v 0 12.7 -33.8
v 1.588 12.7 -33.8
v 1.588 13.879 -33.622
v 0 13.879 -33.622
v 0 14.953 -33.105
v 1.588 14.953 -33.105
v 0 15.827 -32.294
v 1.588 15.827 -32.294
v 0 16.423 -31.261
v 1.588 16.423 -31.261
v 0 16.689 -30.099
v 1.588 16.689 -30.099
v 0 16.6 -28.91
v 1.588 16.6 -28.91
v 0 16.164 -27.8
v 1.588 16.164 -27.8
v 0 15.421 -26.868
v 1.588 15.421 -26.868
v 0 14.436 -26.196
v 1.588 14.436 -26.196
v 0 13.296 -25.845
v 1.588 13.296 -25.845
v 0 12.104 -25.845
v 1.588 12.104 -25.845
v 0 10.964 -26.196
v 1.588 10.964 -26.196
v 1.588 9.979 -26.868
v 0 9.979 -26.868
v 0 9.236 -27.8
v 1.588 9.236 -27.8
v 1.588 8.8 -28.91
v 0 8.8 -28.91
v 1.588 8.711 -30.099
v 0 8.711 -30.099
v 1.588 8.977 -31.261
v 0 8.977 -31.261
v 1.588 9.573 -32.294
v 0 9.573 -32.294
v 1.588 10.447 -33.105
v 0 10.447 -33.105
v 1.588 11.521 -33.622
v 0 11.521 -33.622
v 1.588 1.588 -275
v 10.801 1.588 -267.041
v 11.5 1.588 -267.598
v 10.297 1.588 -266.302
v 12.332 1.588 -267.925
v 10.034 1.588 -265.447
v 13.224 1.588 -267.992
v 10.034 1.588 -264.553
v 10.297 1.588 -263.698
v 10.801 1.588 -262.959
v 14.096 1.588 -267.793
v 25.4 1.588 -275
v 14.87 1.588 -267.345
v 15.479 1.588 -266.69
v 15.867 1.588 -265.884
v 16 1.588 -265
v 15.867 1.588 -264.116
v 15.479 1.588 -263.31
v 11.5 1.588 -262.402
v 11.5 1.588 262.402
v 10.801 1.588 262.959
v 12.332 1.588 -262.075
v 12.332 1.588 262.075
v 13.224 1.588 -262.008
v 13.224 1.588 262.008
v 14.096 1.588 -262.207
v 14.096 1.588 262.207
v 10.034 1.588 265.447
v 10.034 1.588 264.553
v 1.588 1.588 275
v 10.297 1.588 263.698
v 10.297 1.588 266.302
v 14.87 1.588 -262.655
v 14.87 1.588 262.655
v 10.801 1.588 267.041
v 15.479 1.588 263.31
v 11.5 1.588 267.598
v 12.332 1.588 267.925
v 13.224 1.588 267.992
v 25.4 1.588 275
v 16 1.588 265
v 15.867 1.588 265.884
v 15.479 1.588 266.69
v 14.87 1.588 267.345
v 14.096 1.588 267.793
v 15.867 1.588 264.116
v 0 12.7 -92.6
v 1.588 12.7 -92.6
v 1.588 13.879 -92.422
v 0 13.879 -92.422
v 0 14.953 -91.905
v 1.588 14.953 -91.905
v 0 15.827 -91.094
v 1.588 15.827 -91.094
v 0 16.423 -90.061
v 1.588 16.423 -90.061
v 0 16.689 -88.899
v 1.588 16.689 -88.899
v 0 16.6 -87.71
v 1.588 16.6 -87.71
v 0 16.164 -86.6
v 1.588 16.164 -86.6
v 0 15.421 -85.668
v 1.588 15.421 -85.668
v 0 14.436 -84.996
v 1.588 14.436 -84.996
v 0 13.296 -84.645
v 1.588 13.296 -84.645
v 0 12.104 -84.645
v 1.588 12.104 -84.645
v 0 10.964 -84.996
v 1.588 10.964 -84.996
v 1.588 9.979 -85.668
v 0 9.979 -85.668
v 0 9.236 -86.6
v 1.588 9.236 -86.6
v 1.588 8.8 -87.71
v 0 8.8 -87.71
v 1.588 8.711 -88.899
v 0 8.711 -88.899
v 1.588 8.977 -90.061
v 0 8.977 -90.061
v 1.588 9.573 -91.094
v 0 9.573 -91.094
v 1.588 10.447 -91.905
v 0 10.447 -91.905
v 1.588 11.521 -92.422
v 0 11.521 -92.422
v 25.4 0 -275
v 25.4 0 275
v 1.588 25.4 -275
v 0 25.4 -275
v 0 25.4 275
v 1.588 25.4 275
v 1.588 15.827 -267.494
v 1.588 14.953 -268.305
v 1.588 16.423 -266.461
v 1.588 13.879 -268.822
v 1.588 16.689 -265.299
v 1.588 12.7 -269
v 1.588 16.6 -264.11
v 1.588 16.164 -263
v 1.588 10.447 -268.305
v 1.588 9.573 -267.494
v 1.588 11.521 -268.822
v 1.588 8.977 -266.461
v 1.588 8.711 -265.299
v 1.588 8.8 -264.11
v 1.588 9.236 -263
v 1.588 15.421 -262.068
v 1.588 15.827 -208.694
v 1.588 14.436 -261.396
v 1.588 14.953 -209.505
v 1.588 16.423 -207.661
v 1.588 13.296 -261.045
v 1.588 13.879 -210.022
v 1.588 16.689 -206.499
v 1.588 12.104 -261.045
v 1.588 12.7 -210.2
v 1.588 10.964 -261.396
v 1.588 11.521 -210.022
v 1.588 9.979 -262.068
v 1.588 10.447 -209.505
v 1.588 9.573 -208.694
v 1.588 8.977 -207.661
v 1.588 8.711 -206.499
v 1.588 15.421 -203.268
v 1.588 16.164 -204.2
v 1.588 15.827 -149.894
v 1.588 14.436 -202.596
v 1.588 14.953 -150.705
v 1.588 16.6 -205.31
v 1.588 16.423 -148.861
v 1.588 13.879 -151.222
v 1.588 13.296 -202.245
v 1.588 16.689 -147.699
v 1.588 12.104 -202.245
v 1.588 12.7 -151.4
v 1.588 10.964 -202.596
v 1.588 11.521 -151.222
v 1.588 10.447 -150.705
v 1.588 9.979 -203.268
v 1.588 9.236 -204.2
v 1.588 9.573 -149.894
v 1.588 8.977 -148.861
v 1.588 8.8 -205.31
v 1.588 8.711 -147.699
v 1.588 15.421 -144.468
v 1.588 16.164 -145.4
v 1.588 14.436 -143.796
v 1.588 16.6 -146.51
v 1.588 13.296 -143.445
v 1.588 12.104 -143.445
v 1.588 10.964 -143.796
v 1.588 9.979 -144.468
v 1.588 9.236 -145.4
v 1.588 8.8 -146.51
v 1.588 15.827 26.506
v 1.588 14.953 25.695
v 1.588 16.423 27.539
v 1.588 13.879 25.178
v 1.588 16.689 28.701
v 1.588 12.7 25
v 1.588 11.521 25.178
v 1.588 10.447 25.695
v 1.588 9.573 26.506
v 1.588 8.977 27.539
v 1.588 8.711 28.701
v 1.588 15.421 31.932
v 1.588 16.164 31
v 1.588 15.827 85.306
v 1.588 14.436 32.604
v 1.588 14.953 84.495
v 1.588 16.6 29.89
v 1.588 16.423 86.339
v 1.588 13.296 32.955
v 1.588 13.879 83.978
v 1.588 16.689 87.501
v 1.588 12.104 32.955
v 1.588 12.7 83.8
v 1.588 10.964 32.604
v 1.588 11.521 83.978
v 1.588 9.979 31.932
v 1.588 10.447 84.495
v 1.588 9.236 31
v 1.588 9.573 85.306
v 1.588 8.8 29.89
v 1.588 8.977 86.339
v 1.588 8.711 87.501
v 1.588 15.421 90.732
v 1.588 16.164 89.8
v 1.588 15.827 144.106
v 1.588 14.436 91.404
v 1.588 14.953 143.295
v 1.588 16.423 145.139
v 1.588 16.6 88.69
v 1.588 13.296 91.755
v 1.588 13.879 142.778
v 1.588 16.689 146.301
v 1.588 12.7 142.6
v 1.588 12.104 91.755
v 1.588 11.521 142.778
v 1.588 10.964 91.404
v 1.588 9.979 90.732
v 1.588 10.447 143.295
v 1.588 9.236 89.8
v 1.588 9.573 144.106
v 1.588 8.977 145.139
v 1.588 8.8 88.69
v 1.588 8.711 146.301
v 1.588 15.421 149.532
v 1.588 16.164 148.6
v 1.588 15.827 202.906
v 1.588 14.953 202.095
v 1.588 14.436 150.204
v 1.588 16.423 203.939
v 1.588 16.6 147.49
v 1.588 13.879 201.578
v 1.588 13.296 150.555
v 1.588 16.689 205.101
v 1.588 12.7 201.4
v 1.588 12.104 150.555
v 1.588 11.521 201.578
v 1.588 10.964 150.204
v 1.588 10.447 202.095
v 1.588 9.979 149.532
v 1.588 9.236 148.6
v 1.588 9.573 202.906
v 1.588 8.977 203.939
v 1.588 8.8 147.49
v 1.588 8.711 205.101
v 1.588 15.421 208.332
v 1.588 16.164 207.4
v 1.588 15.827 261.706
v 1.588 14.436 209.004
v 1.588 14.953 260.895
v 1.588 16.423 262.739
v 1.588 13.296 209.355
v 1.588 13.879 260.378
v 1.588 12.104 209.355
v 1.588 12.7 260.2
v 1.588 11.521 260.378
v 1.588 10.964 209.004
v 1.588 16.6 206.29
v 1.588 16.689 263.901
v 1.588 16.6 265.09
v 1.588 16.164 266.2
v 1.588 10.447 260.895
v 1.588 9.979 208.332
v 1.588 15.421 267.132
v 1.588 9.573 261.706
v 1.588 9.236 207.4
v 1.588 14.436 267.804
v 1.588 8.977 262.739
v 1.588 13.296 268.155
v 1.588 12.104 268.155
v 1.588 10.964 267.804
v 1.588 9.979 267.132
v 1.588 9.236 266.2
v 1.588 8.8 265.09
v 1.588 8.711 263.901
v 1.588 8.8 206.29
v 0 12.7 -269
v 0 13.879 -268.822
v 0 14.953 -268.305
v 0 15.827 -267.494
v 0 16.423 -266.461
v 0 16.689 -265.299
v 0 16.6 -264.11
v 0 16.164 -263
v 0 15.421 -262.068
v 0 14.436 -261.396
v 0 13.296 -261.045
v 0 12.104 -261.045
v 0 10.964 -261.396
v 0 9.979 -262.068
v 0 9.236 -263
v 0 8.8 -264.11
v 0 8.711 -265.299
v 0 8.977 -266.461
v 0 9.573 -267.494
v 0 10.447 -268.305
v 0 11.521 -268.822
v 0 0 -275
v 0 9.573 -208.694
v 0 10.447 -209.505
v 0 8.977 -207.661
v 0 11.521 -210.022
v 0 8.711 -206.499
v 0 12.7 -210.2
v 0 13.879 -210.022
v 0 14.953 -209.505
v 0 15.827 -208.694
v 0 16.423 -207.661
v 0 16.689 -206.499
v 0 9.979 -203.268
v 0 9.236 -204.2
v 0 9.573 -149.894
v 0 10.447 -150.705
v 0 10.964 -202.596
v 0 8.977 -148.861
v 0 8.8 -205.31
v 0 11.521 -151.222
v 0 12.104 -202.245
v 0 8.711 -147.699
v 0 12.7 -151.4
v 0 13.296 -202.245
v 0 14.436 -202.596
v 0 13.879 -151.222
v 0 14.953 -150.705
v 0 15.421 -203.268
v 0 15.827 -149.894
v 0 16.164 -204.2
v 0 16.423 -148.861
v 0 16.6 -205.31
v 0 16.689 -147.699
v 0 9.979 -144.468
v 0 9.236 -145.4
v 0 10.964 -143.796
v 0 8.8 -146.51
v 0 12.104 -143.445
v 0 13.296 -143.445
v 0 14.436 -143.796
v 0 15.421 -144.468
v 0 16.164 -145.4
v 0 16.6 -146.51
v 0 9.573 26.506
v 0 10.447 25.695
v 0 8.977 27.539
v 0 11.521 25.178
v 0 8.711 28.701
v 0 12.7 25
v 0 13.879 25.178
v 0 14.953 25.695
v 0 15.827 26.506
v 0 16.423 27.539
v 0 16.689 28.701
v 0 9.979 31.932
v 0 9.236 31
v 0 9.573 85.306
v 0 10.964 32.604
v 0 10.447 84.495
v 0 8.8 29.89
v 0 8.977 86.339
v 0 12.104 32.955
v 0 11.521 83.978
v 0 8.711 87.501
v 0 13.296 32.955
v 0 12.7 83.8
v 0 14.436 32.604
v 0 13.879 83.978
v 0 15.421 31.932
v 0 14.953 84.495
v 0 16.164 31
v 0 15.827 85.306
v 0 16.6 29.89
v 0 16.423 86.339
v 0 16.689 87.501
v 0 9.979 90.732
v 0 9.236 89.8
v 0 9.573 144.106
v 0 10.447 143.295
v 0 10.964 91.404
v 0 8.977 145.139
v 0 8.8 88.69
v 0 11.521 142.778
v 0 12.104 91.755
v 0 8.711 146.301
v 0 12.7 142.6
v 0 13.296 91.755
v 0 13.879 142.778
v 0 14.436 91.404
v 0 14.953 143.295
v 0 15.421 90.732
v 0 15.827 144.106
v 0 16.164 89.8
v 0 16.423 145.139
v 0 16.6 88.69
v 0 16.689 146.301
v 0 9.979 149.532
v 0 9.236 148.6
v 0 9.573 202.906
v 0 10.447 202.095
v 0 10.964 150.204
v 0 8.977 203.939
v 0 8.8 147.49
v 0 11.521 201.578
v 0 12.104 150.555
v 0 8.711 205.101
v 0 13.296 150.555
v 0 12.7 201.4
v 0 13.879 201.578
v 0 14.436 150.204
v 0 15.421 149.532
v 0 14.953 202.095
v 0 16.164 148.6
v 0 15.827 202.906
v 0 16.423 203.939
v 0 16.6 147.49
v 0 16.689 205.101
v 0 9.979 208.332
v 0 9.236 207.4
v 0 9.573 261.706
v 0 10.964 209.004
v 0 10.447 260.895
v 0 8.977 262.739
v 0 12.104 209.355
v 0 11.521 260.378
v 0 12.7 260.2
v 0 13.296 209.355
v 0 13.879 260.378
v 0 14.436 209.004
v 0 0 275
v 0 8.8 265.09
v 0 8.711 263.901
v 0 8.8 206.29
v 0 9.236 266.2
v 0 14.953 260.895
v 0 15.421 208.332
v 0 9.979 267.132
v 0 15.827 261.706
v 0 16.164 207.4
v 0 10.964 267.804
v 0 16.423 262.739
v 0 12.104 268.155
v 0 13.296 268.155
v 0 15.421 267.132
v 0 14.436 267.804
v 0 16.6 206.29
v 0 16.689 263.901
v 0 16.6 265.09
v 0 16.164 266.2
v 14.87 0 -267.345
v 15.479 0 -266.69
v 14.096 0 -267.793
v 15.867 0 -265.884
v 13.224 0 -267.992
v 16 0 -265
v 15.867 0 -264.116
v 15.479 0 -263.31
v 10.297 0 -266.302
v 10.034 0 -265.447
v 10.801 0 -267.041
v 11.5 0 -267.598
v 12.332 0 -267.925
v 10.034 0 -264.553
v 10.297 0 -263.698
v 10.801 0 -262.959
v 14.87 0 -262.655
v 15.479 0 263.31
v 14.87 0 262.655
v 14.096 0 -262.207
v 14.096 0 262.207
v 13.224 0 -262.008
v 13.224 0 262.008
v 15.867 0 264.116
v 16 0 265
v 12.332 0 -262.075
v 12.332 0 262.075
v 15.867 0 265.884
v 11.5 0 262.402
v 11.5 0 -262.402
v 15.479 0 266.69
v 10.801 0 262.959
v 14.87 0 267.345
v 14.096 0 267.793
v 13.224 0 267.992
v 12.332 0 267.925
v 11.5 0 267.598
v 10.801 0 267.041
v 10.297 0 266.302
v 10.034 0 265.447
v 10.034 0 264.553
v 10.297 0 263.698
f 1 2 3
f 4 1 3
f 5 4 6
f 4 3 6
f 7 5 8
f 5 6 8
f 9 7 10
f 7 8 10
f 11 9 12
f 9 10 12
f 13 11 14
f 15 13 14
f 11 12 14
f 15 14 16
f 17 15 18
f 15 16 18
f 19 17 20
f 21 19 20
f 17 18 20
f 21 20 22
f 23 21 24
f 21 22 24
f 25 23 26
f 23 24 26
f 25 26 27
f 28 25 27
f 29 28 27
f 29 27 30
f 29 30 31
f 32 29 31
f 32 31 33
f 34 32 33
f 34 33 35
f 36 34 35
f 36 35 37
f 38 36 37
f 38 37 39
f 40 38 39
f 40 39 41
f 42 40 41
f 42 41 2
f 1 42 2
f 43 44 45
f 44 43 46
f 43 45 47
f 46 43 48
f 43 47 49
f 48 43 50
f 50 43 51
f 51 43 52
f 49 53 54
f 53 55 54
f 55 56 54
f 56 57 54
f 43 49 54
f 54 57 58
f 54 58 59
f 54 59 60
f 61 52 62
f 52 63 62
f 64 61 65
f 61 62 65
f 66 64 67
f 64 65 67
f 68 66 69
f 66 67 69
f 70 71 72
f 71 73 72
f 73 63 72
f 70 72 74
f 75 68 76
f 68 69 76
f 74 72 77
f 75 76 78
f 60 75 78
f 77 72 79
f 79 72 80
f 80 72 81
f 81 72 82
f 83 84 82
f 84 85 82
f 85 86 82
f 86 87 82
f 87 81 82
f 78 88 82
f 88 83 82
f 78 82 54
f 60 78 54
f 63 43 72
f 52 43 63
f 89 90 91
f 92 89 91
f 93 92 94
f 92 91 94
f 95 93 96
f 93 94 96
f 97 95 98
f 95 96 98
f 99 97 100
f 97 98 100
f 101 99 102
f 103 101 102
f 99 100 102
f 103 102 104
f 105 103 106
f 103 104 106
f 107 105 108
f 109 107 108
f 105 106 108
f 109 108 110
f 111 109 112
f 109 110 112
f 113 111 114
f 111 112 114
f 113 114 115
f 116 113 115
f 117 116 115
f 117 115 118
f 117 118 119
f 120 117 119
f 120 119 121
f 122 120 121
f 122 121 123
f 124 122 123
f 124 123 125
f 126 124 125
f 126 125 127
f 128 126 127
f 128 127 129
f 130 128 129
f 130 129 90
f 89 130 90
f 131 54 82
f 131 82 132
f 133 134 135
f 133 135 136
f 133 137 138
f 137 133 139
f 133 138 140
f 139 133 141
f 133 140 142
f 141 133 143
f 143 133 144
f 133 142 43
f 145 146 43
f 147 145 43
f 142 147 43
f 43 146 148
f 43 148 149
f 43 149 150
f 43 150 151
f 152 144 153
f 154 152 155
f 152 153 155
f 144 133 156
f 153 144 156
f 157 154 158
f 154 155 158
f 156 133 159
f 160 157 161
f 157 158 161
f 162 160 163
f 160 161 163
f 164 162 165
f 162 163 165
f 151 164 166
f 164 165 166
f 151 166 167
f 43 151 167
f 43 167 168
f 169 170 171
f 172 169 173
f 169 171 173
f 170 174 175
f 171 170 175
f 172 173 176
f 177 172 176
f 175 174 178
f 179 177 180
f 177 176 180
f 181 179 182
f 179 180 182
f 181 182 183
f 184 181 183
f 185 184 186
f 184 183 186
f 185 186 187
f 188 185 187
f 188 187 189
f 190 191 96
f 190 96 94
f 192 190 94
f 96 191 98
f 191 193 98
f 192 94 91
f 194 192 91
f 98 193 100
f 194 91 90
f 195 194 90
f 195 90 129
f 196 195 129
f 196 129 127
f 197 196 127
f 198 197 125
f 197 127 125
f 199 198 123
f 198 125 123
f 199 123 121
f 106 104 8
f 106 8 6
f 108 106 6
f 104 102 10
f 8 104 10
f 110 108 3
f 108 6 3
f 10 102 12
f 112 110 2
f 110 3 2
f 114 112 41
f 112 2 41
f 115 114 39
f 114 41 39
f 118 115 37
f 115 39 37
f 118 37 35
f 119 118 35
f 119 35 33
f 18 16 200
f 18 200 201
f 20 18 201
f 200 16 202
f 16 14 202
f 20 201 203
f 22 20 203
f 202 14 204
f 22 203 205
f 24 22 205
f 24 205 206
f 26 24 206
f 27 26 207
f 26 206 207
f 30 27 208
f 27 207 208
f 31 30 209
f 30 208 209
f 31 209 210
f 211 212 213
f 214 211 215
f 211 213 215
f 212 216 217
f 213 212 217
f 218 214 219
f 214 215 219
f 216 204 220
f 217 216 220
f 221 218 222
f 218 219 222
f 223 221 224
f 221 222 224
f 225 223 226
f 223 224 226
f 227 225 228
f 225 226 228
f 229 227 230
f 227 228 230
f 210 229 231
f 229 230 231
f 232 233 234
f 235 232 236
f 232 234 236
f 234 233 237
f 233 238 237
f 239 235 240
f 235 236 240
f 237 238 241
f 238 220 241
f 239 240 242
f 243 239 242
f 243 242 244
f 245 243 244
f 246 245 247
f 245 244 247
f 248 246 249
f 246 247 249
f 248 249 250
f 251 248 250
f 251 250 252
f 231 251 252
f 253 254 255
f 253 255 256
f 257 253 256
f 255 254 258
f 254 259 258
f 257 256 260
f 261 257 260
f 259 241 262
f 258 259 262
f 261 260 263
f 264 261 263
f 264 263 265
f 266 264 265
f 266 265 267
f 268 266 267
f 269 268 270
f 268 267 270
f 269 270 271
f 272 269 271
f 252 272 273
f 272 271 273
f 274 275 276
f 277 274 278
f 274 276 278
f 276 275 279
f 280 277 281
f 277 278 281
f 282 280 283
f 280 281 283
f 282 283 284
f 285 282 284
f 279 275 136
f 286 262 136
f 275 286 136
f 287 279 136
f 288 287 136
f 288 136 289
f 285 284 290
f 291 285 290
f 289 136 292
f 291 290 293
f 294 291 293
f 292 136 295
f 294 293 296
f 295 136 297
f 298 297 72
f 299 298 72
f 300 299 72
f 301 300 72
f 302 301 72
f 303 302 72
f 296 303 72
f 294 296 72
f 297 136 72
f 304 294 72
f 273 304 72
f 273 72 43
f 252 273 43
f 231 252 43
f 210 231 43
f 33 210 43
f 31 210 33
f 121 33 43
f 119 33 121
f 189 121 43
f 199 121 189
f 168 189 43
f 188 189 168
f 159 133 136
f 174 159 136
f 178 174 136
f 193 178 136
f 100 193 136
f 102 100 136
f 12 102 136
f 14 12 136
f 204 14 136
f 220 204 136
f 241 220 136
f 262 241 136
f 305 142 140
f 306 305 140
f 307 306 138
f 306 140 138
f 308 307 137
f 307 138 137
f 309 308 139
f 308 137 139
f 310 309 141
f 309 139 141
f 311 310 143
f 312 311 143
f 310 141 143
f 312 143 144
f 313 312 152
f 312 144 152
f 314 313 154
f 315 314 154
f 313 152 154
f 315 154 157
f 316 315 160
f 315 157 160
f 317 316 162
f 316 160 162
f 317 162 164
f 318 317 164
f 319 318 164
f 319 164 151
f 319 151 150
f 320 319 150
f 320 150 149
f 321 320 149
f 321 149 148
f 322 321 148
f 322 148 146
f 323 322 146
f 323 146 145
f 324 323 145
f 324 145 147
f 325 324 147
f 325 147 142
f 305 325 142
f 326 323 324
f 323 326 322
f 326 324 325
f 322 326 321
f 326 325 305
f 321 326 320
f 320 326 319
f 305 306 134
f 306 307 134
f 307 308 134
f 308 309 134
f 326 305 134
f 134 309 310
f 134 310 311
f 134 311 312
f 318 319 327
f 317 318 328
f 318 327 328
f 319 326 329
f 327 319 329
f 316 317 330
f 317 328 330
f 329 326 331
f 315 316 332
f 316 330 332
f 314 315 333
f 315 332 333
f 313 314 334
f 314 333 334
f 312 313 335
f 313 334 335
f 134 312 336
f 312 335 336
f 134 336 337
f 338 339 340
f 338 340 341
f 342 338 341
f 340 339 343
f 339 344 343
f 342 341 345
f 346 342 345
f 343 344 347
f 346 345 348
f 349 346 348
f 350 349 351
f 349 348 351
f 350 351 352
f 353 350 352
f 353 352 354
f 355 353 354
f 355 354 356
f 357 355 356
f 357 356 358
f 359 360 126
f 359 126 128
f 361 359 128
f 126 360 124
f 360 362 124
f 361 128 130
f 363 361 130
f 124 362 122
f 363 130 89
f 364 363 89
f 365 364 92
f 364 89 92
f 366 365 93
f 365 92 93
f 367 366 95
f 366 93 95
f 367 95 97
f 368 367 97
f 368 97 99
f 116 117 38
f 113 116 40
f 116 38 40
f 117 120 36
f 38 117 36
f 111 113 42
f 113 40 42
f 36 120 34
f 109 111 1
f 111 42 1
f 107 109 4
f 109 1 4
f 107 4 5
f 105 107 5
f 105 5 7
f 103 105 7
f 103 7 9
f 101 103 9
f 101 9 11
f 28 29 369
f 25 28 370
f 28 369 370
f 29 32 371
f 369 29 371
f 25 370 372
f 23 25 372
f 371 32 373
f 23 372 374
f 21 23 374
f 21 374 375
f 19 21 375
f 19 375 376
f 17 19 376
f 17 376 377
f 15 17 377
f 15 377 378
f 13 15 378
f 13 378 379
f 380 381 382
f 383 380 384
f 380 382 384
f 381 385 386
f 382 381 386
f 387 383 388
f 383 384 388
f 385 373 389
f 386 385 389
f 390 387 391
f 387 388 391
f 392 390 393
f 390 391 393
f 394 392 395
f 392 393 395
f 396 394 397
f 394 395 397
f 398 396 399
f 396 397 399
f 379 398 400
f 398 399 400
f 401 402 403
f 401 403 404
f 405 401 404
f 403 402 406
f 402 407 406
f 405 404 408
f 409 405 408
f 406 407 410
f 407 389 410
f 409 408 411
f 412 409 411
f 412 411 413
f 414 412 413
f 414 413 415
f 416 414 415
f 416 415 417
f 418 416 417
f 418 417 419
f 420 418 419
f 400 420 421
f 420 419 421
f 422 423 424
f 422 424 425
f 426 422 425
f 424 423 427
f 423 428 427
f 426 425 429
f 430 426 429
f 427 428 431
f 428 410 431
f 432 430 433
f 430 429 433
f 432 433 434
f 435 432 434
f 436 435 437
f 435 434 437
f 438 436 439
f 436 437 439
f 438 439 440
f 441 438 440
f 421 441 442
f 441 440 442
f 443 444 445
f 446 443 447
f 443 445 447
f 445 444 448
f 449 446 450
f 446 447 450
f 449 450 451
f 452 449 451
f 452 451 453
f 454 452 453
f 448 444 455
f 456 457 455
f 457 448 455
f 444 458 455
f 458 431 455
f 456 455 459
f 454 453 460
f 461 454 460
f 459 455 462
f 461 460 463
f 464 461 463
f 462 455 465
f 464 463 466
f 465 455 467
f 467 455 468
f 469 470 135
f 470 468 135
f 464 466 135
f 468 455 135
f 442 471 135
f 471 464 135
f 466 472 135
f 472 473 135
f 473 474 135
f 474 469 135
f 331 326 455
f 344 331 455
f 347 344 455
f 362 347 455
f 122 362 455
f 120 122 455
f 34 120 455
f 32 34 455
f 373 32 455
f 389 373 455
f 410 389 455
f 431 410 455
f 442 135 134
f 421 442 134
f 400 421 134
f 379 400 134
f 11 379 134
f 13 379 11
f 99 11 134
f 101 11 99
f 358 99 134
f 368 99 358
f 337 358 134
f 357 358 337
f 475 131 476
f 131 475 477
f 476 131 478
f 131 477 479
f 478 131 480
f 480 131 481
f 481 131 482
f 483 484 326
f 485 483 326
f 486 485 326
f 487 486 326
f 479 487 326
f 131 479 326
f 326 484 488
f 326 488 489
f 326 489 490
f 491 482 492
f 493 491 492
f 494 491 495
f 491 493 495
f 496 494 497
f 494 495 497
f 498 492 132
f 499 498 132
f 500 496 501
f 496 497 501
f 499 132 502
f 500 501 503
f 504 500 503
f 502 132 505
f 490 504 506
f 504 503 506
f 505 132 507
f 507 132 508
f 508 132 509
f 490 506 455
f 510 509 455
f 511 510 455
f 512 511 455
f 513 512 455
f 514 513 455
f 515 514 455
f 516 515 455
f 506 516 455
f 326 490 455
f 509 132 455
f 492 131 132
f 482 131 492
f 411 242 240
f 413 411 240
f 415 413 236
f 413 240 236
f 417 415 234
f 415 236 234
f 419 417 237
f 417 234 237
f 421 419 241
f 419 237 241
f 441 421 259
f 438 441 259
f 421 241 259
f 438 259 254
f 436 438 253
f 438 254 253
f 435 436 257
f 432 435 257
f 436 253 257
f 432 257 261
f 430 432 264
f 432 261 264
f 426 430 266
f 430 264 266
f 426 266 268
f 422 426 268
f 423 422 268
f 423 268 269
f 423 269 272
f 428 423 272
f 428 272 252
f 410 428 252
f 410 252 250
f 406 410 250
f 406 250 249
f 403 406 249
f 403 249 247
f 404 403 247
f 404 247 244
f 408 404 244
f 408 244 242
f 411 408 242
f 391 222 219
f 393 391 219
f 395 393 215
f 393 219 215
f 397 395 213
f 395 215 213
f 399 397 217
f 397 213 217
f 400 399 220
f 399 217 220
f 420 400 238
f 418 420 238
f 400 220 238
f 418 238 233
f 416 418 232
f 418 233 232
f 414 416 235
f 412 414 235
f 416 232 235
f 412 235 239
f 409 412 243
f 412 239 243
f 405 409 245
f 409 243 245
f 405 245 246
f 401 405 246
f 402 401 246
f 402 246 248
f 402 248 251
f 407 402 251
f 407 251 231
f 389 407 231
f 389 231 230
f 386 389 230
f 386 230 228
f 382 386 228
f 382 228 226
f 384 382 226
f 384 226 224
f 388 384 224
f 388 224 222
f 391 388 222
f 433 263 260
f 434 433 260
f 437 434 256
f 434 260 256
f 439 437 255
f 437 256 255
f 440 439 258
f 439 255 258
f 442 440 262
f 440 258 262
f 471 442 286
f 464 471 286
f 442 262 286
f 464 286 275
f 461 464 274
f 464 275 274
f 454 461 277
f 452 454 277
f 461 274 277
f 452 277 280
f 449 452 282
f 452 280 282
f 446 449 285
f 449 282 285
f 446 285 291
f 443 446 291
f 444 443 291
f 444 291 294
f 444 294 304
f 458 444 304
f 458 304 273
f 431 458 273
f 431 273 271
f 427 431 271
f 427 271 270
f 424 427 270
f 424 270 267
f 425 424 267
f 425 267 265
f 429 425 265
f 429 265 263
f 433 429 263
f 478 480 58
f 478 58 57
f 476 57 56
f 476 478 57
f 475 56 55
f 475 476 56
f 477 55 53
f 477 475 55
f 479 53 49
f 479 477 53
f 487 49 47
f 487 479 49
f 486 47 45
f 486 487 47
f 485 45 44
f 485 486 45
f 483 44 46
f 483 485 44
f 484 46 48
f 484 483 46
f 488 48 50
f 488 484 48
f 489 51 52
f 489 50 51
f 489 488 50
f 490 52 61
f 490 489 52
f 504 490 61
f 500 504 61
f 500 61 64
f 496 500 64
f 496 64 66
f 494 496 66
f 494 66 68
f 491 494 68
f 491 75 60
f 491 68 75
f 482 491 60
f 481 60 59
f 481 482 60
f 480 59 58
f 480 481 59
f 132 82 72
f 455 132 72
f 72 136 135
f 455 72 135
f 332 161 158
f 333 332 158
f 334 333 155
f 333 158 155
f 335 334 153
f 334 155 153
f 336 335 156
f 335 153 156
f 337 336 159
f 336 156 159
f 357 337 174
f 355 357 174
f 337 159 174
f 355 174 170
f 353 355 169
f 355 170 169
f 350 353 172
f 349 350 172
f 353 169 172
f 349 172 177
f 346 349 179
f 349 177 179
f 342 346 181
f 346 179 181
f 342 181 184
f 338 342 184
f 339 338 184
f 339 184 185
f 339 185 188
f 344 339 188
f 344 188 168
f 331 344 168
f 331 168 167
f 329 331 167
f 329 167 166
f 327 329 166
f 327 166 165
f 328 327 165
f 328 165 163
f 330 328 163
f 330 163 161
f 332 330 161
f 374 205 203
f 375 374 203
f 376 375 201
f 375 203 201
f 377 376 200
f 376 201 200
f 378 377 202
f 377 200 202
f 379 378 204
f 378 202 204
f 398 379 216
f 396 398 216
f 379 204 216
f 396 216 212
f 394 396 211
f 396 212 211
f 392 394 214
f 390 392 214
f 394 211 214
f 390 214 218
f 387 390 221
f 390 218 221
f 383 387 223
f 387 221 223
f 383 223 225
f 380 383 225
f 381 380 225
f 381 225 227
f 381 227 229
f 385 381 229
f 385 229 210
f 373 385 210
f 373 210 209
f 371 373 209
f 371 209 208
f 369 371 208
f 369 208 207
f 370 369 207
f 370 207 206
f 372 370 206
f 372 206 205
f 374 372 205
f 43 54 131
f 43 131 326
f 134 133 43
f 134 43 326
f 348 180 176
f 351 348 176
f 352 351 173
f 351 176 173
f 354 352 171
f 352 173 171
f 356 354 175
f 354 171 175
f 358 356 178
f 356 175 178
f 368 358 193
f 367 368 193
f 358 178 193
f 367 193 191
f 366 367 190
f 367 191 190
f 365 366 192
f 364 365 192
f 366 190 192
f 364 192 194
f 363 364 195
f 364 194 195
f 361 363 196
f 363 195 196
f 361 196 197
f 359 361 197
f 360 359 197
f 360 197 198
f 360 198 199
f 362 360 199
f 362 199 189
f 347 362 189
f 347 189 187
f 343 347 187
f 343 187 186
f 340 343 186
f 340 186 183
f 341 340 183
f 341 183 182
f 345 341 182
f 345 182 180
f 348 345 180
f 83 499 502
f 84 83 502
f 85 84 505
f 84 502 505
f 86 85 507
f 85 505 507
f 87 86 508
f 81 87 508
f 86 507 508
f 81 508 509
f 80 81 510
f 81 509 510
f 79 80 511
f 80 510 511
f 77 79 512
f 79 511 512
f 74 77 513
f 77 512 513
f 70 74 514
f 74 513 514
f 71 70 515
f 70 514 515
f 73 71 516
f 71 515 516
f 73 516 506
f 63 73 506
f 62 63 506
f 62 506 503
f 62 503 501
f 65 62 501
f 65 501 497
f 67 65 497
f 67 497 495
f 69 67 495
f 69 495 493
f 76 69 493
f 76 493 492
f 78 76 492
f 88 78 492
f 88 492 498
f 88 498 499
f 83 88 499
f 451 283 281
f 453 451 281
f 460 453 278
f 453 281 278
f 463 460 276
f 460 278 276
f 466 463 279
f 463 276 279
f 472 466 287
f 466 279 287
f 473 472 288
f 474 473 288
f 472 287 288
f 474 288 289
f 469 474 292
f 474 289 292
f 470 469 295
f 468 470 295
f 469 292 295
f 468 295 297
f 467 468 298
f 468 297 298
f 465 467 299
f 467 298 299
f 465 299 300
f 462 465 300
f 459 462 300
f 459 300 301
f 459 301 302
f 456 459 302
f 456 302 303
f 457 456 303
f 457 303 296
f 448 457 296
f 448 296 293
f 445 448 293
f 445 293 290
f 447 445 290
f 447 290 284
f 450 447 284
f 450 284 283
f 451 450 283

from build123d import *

# Parameters (mm, degrees)
BOSS_EXTRUDE1_DEPTH = 275
SKETCH2_R           = 4
CUT_EXTRUDE1_DEPTH  = 2.5875
CUT_EXTRUDE2_START  = -2.5875
SKETCH3_R           = 3
CUT_EXTRUDE2_DEPTH  = 27.4


with BuildPart() as part:
    # Sketch1 → Boss-Extrude1 (new body, symmetric)
    with BuildSketch(Plane.XY):
        Polygon((0, 0), (0, 25.4), (1.5875, 25.4), (1.5875, 1.5875), (25.4, 1.5875), (25.4, 0), align=None)
    extrude(amount=BOSS_EXTRUDE1_DEPTH, both=True)

    # Sketch2 → Cut-Extrude1 (cut, through all)
    with BuildSketch(Plane(origin=(1.5875, 0, 0), x_dir=(0, 0, -1), z_dir=(1, 0, 0))):
        with Locations((265, 12.7)):
            Circle(SKETCH2_R)
        with Locations((206.2, 12.7)):
            Circle(SKETCH2_R)
        with Locations((147.4, 12.7)):
            Circle(SKETCH2_R)
        with Locations((88.6, 12.7)):
            Circle(SKETCH2_R)
        with Locations((29.8, 12.7)):
            Circle(SKETCH2_R)
        with Locations((-29, 12.7)):
            Circle(SKETCH2_R)
        with Locations((-87.8, 12.7)):
            Circle(SKETCH2_R)
        with Locations((-146.6, 12.7)):
            Circle(SKETCH2_R)
        with Locations((-205.4, 12.7)):
            Circle(SKETCH2_R)
        with Locations((-264.2, 12.7)):
            Circle(SKETCH2_R)
    extrude(amount=-CUT_EXTRUDE1_DEPTH, mode=Mode.SUBTRACT)

    # Sketch3 → Cut-Extrude2 (cut)
    with BuildSketch(Plane(origin=(0, 1.5875, 0), x_dir=(1, 0, 0), z_dir=(0, 1, 0)).offset(CUT_EXTRUDE2_START)):
        with Locations((13, 265)):
            Circle(SKETCH3_R)
    cut_extrude2 = extrude(amount=CUT_EXTRUDE2_DEPTH, mode=Mode.SUBTRACT)

    # Mirror1: Cut-Extrude2 across plane
    add(cut_extrude2.mirror(Plane.XY), mode=Mode.SUBTRACT)


solid = part.part
